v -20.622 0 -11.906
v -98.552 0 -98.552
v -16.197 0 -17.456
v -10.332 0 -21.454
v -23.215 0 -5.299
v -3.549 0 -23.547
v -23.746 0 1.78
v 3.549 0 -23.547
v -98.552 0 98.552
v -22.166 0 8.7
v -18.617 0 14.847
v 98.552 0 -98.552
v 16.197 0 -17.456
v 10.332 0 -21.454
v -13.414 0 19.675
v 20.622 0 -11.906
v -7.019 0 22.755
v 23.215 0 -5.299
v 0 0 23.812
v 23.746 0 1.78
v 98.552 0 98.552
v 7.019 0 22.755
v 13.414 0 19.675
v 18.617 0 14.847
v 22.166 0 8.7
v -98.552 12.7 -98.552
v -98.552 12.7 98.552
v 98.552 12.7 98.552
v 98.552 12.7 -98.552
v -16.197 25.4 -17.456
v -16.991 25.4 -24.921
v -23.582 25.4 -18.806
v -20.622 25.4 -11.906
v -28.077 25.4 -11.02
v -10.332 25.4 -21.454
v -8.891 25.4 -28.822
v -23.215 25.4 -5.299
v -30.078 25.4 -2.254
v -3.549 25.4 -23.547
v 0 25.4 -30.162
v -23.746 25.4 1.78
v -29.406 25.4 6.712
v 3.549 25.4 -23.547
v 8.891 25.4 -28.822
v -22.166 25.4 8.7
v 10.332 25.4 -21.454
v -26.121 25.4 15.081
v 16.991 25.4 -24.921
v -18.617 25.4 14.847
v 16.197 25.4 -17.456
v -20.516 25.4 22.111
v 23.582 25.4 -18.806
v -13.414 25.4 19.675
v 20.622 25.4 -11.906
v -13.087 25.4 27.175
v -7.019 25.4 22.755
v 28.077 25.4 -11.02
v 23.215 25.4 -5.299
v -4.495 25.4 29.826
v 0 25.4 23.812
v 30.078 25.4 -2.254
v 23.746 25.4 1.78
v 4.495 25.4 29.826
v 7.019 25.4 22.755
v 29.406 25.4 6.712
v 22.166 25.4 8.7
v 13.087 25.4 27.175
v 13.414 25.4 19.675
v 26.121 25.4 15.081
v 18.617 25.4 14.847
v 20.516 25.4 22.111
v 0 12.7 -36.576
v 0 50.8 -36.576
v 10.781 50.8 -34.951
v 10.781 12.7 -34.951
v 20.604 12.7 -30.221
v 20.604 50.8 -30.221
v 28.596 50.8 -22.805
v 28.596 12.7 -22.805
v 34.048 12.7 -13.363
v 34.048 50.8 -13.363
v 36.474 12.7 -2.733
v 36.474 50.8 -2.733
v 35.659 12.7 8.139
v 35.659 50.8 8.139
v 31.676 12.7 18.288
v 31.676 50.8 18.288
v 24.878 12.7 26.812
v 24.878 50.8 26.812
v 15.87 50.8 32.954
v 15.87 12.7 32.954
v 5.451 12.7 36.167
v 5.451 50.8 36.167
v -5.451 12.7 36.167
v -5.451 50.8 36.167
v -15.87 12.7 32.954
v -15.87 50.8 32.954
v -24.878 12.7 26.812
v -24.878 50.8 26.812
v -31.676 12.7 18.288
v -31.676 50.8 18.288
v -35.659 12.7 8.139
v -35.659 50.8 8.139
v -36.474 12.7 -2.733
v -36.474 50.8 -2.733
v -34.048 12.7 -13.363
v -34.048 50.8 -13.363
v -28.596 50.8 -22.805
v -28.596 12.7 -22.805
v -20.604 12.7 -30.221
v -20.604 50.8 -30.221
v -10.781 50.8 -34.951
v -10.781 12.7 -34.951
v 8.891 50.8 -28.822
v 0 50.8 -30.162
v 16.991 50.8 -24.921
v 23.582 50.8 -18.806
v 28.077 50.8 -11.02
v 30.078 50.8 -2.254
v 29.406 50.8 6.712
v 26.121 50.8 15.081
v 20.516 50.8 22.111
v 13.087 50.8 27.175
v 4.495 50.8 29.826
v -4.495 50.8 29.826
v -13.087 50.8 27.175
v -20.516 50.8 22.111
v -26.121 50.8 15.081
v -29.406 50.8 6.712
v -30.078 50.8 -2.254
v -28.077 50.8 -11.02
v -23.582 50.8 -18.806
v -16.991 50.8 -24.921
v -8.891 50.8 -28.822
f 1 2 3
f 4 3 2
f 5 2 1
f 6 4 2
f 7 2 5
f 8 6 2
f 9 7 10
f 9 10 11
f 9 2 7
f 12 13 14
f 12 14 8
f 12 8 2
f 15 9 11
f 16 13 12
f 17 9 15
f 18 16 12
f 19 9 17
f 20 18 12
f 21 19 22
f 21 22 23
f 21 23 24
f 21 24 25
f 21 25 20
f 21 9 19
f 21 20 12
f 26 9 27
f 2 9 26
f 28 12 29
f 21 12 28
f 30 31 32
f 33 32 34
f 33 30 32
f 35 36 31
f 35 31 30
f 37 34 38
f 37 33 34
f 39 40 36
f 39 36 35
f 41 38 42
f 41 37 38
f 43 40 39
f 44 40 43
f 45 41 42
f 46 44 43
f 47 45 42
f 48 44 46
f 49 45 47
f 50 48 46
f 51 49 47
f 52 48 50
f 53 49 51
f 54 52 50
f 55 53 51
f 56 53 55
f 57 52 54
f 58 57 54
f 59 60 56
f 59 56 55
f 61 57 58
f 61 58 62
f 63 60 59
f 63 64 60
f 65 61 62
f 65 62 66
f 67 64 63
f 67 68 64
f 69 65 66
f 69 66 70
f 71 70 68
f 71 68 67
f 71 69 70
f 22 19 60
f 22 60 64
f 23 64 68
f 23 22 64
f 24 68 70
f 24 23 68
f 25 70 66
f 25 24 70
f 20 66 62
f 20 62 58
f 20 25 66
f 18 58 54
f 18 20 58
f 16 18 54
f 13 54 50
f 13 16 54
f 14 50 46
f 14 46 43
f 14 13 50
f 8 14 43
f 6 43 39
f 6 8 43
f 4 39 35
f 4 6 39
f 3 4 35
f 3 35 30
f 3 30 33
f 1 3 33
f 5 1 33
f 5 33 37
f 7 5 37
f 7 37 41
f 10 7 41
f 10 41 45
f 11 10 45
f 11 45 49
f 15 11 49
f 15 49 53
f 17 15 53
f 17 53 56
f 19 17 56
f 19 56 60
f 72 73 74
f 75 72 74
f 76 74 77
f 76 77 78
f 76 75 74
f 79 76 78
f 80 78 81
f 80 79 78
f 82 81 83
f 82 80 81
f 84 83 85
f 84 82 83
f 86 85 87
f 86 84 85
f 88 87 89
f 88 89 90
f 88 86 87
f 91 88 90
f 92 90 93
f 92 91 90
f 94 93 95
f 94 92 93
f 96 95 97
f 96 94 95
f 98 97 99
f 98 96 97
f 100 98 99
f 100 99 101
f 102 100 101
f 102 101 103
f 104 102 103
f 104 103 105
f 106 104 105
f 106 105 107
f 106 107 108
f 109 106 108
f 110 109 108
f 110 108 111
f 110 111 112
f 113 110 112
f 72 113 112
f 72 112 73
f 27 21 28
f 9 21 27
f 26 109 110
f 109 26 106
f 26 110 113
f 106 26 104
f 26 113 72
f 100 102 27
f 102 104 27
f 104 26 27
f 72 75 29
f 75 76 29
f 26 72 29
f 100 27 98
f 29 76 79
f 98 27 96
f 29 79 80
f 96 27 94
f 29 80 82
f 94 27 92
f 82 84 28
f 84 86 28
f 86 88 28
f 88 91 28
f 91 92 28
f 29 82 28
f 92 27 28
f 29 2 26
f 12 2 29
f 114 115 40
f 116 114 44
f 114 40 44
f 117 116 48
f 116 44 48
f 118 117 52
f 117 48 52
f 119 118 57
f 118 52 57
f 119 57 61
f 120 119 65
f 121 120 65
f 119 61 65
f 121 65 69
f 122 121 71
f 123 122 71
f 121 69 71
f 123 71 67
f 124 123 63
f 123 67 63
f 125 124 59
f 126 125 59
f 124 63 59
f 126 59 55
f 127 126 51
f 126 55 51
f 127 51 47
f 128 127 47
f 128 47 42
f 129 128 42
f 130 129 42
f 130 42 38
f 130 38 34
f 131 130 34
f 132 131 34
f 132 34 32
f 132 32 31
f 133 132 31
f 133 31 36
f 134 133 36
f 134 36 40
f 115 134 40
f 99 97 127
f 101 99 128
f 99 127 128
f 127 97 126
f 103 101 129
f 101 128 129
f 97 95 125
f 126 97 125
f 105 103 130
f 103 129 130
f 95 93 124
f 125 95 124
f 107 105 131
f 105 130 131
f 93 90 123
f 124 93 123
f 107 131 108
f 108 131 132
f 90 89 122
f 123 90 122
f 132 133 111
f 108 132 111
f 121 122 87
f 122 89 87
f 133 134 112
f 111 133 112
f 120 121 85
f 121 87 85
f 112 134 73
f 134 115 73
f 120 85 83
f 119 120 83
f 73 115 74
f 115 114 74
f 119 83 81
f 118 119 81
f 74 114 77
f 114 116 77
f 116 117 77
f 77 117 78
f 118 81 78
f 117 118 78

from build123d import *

# Parameters (mm, degrees)
SKETCH1_R           = 30.1625
SKETCH1_R_2         = 23.8125
ID_2_DEPTH          = 25.4
SKETCH2_R           = 36.576
SKETCH2_R_2         = 30.1625
OD_DEPTH            = 50.8
SKETCH4_R           = 23.8125
BOSS_EXTRUDE3_DEPTH = 12.7


with BuildPart() as part:
    # Sketch1 → ID 2 (new body)
    with BuildSketch(Plane(origin=(0, 0, 0), x_dir=(1, 0, 0), z_dir=(0, 1, 0))):
        with Locations(Location((0, 0, 0), (0, 0, 270))):
            Circle(SKETCH1_R)
        with Locations(Location((0, 0, 0), (0, 0, 270))):
            Circle(SKETCH1_R_2, mode=Mode.SUBTRACT)
    extrude(amount=ID_2_DEPTH)

    # Sketch2 → OD (add)
    with BuildSketch(Plane.XZ):
        with Locations(Location((0, 0, 0), (0, 0, 270))):
            Circle(SKETCH2_R)
        with Locations(Location((0, 0, 0), (0, 0, 270))):
            Circle(SKETCH2_R_2, mode=Mode.SUBTRACT)
    extrude(amount=-OD_DEPTH)

    # Sketch4 → Boss-Extrude3 (add)
    with BuildSketch(Plane.XZ):
        Polygon((0, 98.552), (-98.552, 98.552), (-98.552, 0), (-98.552, -98.552), (0, -98.552), (98.552, -98.552), (98.552, 0), (98.552, 98.552), align=None)
        with Locations(Location((0, 0, 0), (0, 0, 90))):
            Circle(SKETCH4_R, mode=Mode.SUBTRACT)
    extrude(amount=-BOSS_EXTRUDE3_DEPTH)


solid = part.part
